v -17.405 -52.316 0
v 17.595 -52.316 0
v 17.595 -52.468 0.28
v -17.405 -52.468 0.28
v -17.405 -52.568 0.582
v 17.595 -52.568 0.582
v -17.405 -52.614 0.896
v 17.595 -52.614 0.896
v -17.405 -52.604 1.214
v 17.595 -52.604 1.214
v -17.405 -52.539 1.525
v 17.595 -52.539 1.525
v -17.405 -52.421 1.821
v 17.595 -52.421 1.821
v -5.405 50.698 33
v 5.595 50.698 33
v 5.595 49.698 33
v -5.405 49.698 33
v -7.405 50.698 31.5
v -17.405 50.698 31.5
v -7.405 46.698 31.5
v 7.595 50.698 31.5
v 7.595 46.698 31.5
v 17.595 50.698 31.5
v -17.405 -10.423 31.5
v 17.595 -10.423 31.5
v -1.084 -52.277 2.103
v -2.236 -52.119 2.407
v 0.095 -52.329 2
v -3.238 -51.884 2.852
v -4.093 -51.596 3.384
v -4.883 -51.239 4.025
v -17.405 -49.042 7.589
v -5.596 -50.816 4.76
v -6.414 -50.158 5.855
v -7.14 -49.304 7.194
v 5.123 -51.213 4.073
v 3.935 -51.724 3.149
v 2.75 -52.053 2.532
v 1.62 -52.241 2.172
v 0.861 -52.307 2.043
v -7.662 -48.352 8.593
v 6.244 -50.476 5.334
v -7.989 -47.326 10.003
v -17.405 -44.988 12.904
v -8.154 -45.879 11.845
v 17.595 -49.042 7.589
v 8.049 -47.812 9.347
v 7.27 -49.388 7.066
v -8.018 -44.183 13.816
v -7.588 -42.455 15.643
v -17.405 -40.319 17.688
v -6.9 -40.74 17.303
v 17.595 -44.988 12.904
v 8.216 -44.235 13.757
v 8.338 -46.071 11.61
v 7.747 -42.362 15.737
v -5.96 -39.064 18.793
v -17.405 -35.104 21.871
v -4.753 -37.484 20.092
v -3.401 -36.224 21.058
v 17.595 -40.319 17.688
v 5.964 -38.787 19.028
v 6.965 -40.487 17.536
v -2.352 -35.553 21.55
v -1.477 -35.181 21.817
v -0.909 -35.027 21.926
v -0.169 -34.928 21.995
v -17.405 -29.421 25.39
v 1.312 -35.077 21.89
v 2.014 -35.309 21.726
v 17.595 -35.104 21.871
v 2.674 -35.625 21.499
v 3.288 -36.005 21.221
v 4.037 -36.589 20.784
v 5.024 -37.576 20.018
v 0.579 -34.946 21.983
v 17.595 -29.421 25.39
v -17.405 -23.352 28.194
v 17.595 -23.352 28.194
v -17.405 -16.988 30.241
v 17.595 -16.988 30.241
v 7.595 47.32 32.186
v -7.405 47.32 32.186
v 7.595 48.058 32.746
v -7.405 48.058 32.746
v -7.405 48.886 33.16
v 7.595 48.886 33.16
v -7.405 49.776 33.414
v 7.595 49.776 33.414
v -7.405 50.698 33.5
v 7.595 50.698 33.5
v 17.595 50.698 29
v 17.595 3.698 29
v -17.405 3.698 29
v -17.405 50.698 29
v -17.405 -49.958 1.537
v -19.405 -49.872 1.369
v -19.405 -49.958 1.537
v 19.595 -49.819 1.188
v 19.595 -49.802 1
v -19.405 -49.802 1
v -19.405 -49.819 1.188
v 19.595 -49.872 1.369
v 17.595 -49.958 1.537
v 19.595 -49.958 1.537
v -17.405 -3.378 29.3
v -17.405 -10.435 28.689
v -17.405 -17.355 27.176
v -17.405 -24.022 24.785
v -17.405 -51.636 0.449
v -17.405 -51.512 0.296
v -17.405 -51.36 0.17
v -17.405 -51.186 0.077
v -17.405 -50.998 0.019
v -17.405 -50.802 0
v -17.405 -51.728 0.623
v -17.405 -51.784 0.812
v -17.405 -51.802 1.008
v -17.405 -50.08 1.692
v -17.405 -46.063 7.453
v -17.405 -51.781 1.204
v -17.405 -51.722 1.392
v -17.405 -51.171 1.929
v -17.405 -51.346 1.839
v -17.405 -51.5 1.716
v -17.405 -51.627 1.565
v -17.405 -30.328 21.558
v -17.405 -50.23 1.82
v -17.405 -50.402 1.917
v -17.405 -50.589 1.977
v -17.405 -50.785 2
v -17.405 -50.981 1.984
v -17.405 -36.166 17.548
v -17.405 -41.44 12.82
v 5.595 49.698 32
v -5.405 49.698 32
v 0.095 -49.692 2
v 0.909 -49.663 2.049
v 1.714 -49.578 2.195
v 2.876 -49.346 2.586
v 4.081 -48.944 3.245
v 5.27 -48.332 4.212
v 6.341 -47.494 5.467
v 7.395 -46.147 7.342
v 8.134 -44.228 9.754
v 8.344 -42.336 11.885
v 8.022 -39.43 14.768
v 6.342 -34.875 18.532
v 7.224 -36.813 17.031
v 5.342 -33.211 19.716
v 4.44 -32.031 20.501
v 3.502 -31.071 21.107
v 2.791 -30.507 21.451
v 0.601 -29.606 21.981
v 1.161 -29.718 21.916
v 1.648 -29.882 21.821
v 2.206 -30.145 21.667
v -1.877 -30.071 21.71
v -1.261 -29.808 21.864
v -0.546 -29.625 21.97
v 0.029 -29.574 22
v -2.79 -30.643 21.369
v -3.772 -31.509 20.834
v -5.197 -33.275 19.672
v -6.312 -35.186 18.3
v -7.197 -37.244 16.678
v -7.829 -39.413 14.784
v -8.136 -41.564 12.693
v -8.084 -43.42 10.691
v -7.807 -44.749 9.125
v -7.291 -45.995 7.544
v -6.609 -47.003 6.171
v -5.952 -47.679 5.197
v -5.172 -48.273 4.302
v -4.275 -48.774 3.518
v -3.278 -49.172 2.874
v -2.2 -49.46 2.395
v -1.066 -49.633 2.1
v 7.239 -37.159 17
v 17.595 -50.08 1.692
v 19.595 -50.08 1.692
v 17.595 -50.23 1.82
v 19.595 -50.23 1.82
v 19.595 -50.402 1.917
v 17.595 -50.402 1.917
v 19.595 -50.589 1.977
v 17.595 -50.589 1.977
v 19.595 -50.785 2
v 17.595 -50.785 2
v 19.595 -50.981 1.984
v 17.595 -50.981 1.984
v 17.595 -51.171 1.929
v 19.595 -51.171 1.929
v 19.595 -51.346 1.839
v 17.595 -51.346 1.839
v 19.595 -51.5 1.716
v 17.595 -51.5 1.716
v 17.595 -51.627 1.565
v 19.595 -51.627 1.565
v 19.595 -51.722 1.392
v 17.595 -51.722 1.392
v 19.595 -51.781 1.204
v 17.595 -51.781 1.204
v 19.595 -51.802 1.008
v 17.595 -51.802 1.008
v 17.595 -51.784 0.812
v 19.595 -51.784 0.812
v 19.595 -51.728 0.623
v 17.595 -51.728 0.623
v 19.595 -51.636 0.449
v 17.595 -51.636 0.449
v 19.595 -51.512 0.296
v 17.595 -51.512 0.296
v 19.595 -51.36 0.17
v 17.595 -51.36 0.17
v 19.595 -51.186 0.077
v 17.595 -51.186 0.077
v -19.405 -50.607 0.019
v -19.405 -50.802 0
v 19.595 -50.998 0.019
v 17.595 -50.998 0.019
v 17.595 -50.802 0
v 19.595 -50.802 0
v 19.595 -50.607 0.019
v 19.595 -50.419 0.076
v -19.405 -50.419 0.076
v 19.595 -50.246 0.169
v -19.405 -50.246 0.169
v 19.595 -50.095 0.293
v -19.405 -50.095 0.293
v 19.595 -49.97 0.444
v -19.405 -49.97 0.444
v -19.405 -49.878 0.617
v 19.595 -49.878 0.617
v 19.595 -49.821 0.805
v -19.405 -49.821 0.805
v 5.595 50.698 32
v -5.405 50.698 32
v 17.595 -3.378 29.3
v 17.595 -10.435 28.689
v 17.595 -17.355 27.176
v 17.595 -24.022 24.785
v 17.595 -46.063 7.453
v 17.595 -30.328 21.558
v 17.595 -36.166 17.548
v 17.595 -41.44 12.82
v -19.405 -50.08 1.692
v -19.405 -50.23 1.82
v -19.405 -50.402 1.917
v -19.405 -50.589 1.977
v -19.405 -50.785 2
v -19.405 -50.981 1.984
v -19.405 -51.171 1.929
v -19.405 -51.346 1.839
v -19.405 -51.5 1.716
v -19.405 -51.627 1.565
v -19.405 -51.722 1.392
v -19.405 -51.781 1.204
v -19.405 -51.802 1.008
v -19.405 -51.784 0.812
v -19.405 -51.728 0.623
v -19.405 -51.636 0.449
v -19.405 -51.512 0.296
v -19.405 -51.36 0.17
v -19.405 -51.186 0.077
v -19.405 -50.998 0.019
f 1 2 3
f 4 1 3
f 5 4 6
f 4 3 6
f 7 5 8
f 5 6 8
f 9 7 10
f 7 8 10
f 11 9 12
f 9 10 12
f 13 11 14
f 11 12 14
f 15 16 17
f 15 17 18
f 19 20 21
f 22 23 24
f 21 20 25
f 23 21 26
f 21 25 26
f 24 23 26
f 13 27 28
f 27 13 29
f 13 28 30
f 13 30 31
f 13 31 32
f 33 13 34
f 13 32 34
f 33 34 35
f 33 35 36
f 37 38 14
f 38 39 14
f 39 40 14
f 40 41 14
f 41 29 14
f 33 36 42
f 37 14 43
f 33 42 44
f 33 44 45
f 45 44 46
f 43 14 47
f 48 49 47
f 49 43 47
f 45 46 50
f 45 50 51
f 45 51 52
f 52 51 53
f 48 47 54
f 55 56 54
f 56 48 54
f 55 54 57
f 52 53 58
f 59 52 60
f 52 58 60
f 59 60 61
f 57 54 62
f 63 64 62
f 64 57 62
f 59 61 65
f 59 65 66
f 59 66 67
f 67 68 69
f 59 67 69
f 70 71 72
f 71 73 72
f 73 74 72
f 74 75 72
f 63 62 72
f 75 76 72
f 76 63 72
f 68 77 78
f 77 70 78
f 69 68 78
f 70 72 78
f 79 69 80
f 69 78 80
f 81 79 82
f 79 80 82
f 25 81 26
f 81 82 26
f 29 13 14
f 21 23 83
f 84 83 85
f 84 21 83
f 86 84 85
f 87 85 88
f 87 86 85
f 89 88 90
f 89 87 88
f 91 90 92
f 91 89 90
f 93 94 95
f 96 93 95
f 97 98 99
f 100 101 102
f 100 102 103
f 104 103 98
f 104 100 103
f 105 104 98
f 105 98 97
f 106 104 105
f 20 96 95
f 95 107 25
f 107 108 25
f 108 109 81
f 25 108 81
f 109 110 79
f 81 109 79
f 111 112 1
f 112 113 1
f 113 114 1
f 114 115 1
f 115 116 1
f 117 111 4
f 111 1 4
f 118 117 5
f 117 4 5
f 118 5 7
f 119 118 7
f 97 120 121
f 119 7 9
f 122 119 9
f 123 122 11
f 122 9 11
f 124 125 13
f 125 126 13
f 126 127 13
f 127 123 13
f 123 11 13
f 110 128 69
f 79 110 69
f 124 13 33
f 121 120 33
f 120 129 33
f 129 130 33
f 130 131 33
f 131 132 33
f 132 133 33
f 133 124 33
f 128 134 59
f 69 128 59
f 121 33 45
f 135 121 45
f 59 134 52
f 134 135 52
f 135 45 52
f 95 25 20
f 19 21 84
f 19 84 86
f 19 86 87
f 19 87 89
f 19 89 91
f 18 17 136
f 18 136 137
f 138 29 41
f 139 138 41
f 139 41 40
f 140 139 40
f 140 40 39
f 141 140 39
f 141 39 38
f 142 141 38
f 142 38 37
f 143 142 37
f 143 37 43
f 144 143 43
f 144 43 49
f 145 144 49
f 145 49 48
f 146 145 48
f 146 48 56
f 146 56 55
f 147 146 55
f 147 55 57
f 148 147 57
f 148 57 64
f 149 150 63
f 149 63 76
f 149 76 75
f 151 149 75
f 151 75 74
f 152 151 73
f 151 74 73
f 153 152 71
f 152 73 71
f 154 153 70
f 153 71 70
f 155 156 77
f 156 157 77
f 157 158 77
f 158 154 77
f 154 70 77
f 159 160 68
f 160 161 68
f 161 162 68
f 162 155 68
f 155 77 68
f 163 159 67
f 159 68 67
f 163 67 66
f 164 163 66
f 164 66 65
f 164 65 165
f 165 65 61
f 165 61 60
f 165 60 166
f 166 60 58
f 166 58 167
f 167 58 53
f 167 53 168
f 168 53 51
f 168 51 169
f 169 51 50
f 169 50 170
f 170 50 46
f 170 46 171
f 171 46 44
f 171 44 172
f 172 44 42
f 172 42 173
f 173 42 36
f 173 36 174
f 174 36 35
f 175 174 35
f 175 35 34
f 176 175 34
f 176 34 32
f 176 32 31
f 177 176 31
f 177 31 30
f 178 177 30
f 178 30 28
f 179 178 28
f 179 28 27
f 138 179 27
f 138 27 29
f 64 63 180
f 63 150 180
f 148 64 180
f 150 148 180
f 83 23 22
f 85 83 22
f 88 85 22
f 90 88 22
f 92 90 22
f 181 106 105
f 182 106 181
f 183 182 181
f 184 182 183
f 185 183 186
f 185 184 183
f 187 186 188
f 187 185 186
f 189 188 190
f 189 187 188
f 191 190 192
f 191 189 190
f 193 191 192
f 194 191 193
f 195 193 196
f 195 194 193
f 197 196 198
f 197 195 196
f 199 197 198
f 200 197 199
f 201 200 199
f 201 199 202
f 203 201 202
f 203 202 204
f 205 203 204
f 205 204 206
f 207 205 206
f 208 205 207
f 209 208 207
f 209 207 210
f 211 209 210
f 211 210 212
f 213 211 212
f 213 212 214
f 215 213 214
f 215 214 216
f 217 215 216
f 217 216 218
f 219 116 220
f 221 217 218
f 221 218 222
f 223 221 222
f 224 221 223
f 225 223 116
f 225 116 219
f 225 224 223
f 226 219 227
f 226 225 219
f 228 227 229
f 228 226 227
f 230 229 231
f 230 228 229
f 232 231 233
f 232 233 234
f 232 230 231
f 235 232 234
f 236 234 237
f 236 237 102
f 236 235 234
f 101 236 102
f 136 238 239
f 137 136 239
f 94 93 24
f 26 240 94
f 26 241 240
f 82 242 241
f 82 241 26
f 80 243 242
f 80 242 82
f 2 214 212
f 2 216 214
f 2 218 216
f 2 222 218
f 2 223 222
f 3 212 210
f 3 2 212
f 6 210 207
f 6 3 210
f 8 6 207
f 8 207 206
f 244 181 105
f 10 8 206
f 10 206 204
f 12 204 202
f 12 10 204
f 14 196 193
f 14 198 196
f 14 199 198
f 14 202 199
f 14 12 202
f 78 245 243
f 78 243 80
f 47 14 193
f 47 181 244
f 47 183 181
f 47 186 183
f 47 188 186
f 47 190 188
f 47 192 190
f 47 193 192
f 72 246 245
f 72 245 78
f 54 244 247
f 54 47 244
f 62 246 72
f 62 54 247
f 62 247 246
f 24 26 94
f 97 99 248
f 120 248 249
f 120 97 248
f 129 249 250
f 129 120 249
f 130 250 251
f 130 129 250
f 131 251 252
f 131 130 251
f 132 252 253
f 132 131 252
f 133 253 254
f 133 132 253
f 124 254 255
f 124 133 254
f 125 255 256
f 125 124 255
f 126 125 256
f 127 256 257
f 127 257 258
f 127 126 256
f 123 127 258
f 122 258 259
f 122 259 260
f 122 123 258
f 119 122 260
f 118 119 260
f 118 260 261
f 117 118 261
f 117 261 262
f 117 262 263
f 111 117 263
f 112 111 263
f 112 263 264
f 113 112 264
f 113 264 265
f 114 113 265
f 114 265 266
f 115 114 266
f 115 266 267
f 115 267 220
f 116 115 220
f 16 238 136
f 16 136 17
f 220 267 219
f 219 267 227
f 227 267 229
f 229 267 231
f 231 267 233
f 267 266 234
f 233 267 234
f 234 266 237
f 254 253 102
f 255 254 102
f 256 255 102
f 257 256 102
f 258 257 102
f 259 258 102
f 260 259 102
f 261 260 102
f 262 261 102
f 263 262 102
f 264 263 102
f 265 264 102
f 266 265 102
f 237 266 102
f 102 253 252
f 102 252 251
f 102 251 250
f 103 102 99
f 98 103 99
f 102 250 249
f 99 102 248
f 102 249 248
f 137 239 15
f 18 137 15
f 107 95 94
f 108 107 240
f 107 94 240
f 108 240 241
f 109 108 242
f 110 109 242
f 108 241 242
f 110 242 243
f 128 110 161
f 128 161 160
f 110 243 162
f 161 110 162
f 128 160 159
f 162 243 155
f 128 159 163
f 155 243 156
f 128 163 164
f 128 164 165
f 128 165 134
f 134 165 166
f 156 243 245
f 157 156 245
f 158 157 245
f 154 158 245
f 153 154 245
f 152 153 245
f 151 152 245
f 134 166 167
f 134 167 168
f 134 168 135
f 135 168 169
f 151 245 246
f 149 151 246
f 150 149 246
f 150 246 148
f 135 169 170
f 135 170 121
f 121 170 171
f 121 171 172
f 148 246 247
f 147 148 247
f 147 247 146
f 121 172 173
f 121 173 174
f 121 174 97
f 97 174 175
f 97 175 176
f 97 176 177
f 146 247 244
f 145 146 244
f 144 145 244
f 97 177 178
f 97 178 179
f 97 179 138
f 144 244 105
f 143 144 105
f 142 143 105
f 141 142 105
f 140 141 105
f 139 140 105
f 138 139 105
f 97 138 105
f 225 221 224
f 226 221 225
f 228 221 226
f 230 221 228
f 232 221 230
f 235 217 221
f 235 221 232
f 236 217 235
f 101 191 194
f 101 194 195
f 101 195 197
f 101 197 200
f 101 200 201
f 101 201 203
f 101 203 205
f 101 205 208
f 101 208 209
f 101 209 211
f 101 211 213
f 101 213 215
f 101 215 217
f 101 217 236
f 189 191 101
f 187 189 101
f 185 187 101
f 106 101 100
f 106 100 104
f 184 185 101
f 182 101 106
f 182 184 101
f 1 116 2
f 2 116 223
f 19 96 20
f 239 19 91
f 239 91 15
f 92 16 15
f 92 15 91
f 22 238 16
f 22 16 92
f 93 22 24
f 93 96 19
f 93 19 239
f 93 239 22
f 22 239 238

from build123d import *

# Parameters (mm, degrees)
F0_W          = 35
F0_H          = 57
F1_DEPTH      = 31.5
F4_DEPTH      = 57.001
F5_DEPTH      = 35.0010001
F7_DEPTH      = 35.0010001
F9_DEPTH      = 2
F9_DEPTH_BACK = 37
F11_DEPTH     = 37.001
F12_DEPTH     = 47
F13_W         = 15
F13_H         = 4
F14_DEPTH     = 2
F15_T1_DEPTH  = 35
F16_W         = 11
F16_H         = 1
F17_DEPTH     = 1


# Not quite as in the source:
# - a fillet or chamfer that OpenCascade refuses, or shapes differently, is made with other operations: its cross-section is extruded or revolved along the edge and cut away or added


with BuildPart() as f1:
    # F0 (on Top) → F1 (new body)
    with BuildSketch(Plane.XY):
        with Locations((0.0945744105, -24.8016776452)):
            Rectangle(F0_W, F0_H)
    extrude(amount=F1_DEPTH)

    # F3 (on face) → F4 (cut, through all)
    with BuildSketch(Plane.XZ.offset(53.3016776452)):
        with BuildLine():
            add(Edge.make_bspline(
                [(0.0945744105, 2), (14.3839935729, 2), (7.2392839917, 17), (0.0945744105, 32), (-7.0501351708, 17), (-14.194844752, 2), (0.0945744105, 2)],
                knots=[0, 0, 0, 2.0943951024, 2.0943951024, 4.1887902048, 4.1887902048, 6.2831853072, 6.2831853072, 6.2831853072], degree=2, weights=[1, 0.5, 1, 0.5, 1, 0.5, 1]))
        make_face()
    extrude(amount=-F4_DEPTH, mode=Mode.SUBTRACT)

    # F2 (on face) → F5 (cut, through all)
    with BuildSketch(Plane.YZ.offset(17.5945744105)):
        with BuildLine():
            ThreePointArc((-53.3016776452, 0), (-35.9248296563, 21.279893434), (-10.4231016291, 31.5))
            Line((-10.4231016291, 31.5), (-53.3016776452, 31.5))
            Line((-53.3016776452, 31.5), (-53.3016776452, 0))
        make_face()
    extrude(amount=-F5_DEPTH, mode=Mode.SUBTRACT)

    # F6 (on face) → F7 (cut, through all)
    with BuildSketch(Plane.YZ.offset(17.5945744105)):
        with BuildLine():
            Line((3.6983223548, 0), (3.6983223548, 29))
            ThreePointArc((3.6983223548, 29), (-28.0042777095, 22.8678173622), (-50.8016776452, 0))
            Line((-50.8016776452, 0), (3.6983223548, 0))
        make_face()
    extrude(amount=-F7_DEPTH, mode=Mode.SUBTRACT)

    # F8 (on face) → F9 (join, two sides)
    with BuildSketch(Plane.YZ.offset(17.5945744105)) as f9_sk:
        with BuildLine():
            ThreePointArc((-49.9582016017, 1.5371667936), (-51.6783665277, 1.4810577961), (-50.8016776452, 0))
            ThreePointArc((-50.8016776452, 0), (-50.3860655446, 0.7719448198), (-49.9582016017, 1.5371667936))
        make_face()
        with BuildLine():
            ThreePointArc((-49.9582016017, 1.5371667936), (-50.3860655446, 0.7719448198), (-50.8016776452, 0))
            ThreePointArc((-50.8016776452, 0), (-50.094570864, 0.2928932188), (-49.8016776452, 1))
            ThreePointArc((-49.8016776452, 1), (-49.8416057615, 1.2797534241), (-49.9582016017, 1.5371667936))
        make_face()
    extrude(amount=F9_DEPTH)
    extrude(f9_sk.sketch, amount=-F9_DEPTH_BACK)

    # F10 (on face) → F11 (cut, through all)
    with BuildSketch(Plane.YZ.offset(17.5945744105)):
        with BuildLine():
            Line((-53.3016776452, 0), (-52.3163572735, 0))
            ThreePointArc((-52.3163572735, 0), (-52.6137174082, 0.8962393447), (-52.4206060402, 1.8205639696))
            ThreePointArc((-52.4206060402, 1.8205639696), (-52.8695111773, 0.9143323688), (-53.3016776452, 0))
        make_face()
    extrude(amount=-F11_DEPTH, mode=Mode.SUBTRACT)

    # F12 (add): a face of the model
    f12_faces = [f1.faces().sort_by_distance(p)[0] for p in [
        (0.0945744105, 3.6983223548, 30.25),
    ]]
    extrude(f12_faces, amount=F12_DEPTH)

    # F13 (on face) → F14 (join)
    with BuildSketch(Plane.XY.offset(31.5)):
        with Locations((0.0945744105, 48.6983223548)):
            Rectangle(F13_W, F13_H)
    extrude(amount=F14_DEPTH)

    # F15: fillet of radius 5 on 1 edges, made by hand

    # F15_s2 → F15_t1 (cut)
    with BuildSketch(Plane.YZ.offset(-17.4054255895)):
        with BuildLine():
            ThreePointArc((46.6983223548, 31.5), (48.4622543773, 32.972135955), (50.6983223548, 33.5))
            Line((50.6983223548, 33.5), (46.6983223548, 33.5))
            Line((46.6983223548, 33.5), (46.6983223548, 31.5))
        make_face()
    extrude(amount=F15_T1_DEPTH, mode=Mode.SUBTRACT)

    # F16 (on face) → F17 (cut)
    with BuildSketch(Plane(origin=(0, 50.6983223548, 0), x_dir=(-1, 0, 0), z_dir=(0, 1, 0))):
        with Locations((-0.0945744105, 32.5)):
            Rectangle(F16_W, F16_H)
    extrude(amount=-F17_DEPTH, mode=Mode.SUBTRACT)


solid = f1.part
